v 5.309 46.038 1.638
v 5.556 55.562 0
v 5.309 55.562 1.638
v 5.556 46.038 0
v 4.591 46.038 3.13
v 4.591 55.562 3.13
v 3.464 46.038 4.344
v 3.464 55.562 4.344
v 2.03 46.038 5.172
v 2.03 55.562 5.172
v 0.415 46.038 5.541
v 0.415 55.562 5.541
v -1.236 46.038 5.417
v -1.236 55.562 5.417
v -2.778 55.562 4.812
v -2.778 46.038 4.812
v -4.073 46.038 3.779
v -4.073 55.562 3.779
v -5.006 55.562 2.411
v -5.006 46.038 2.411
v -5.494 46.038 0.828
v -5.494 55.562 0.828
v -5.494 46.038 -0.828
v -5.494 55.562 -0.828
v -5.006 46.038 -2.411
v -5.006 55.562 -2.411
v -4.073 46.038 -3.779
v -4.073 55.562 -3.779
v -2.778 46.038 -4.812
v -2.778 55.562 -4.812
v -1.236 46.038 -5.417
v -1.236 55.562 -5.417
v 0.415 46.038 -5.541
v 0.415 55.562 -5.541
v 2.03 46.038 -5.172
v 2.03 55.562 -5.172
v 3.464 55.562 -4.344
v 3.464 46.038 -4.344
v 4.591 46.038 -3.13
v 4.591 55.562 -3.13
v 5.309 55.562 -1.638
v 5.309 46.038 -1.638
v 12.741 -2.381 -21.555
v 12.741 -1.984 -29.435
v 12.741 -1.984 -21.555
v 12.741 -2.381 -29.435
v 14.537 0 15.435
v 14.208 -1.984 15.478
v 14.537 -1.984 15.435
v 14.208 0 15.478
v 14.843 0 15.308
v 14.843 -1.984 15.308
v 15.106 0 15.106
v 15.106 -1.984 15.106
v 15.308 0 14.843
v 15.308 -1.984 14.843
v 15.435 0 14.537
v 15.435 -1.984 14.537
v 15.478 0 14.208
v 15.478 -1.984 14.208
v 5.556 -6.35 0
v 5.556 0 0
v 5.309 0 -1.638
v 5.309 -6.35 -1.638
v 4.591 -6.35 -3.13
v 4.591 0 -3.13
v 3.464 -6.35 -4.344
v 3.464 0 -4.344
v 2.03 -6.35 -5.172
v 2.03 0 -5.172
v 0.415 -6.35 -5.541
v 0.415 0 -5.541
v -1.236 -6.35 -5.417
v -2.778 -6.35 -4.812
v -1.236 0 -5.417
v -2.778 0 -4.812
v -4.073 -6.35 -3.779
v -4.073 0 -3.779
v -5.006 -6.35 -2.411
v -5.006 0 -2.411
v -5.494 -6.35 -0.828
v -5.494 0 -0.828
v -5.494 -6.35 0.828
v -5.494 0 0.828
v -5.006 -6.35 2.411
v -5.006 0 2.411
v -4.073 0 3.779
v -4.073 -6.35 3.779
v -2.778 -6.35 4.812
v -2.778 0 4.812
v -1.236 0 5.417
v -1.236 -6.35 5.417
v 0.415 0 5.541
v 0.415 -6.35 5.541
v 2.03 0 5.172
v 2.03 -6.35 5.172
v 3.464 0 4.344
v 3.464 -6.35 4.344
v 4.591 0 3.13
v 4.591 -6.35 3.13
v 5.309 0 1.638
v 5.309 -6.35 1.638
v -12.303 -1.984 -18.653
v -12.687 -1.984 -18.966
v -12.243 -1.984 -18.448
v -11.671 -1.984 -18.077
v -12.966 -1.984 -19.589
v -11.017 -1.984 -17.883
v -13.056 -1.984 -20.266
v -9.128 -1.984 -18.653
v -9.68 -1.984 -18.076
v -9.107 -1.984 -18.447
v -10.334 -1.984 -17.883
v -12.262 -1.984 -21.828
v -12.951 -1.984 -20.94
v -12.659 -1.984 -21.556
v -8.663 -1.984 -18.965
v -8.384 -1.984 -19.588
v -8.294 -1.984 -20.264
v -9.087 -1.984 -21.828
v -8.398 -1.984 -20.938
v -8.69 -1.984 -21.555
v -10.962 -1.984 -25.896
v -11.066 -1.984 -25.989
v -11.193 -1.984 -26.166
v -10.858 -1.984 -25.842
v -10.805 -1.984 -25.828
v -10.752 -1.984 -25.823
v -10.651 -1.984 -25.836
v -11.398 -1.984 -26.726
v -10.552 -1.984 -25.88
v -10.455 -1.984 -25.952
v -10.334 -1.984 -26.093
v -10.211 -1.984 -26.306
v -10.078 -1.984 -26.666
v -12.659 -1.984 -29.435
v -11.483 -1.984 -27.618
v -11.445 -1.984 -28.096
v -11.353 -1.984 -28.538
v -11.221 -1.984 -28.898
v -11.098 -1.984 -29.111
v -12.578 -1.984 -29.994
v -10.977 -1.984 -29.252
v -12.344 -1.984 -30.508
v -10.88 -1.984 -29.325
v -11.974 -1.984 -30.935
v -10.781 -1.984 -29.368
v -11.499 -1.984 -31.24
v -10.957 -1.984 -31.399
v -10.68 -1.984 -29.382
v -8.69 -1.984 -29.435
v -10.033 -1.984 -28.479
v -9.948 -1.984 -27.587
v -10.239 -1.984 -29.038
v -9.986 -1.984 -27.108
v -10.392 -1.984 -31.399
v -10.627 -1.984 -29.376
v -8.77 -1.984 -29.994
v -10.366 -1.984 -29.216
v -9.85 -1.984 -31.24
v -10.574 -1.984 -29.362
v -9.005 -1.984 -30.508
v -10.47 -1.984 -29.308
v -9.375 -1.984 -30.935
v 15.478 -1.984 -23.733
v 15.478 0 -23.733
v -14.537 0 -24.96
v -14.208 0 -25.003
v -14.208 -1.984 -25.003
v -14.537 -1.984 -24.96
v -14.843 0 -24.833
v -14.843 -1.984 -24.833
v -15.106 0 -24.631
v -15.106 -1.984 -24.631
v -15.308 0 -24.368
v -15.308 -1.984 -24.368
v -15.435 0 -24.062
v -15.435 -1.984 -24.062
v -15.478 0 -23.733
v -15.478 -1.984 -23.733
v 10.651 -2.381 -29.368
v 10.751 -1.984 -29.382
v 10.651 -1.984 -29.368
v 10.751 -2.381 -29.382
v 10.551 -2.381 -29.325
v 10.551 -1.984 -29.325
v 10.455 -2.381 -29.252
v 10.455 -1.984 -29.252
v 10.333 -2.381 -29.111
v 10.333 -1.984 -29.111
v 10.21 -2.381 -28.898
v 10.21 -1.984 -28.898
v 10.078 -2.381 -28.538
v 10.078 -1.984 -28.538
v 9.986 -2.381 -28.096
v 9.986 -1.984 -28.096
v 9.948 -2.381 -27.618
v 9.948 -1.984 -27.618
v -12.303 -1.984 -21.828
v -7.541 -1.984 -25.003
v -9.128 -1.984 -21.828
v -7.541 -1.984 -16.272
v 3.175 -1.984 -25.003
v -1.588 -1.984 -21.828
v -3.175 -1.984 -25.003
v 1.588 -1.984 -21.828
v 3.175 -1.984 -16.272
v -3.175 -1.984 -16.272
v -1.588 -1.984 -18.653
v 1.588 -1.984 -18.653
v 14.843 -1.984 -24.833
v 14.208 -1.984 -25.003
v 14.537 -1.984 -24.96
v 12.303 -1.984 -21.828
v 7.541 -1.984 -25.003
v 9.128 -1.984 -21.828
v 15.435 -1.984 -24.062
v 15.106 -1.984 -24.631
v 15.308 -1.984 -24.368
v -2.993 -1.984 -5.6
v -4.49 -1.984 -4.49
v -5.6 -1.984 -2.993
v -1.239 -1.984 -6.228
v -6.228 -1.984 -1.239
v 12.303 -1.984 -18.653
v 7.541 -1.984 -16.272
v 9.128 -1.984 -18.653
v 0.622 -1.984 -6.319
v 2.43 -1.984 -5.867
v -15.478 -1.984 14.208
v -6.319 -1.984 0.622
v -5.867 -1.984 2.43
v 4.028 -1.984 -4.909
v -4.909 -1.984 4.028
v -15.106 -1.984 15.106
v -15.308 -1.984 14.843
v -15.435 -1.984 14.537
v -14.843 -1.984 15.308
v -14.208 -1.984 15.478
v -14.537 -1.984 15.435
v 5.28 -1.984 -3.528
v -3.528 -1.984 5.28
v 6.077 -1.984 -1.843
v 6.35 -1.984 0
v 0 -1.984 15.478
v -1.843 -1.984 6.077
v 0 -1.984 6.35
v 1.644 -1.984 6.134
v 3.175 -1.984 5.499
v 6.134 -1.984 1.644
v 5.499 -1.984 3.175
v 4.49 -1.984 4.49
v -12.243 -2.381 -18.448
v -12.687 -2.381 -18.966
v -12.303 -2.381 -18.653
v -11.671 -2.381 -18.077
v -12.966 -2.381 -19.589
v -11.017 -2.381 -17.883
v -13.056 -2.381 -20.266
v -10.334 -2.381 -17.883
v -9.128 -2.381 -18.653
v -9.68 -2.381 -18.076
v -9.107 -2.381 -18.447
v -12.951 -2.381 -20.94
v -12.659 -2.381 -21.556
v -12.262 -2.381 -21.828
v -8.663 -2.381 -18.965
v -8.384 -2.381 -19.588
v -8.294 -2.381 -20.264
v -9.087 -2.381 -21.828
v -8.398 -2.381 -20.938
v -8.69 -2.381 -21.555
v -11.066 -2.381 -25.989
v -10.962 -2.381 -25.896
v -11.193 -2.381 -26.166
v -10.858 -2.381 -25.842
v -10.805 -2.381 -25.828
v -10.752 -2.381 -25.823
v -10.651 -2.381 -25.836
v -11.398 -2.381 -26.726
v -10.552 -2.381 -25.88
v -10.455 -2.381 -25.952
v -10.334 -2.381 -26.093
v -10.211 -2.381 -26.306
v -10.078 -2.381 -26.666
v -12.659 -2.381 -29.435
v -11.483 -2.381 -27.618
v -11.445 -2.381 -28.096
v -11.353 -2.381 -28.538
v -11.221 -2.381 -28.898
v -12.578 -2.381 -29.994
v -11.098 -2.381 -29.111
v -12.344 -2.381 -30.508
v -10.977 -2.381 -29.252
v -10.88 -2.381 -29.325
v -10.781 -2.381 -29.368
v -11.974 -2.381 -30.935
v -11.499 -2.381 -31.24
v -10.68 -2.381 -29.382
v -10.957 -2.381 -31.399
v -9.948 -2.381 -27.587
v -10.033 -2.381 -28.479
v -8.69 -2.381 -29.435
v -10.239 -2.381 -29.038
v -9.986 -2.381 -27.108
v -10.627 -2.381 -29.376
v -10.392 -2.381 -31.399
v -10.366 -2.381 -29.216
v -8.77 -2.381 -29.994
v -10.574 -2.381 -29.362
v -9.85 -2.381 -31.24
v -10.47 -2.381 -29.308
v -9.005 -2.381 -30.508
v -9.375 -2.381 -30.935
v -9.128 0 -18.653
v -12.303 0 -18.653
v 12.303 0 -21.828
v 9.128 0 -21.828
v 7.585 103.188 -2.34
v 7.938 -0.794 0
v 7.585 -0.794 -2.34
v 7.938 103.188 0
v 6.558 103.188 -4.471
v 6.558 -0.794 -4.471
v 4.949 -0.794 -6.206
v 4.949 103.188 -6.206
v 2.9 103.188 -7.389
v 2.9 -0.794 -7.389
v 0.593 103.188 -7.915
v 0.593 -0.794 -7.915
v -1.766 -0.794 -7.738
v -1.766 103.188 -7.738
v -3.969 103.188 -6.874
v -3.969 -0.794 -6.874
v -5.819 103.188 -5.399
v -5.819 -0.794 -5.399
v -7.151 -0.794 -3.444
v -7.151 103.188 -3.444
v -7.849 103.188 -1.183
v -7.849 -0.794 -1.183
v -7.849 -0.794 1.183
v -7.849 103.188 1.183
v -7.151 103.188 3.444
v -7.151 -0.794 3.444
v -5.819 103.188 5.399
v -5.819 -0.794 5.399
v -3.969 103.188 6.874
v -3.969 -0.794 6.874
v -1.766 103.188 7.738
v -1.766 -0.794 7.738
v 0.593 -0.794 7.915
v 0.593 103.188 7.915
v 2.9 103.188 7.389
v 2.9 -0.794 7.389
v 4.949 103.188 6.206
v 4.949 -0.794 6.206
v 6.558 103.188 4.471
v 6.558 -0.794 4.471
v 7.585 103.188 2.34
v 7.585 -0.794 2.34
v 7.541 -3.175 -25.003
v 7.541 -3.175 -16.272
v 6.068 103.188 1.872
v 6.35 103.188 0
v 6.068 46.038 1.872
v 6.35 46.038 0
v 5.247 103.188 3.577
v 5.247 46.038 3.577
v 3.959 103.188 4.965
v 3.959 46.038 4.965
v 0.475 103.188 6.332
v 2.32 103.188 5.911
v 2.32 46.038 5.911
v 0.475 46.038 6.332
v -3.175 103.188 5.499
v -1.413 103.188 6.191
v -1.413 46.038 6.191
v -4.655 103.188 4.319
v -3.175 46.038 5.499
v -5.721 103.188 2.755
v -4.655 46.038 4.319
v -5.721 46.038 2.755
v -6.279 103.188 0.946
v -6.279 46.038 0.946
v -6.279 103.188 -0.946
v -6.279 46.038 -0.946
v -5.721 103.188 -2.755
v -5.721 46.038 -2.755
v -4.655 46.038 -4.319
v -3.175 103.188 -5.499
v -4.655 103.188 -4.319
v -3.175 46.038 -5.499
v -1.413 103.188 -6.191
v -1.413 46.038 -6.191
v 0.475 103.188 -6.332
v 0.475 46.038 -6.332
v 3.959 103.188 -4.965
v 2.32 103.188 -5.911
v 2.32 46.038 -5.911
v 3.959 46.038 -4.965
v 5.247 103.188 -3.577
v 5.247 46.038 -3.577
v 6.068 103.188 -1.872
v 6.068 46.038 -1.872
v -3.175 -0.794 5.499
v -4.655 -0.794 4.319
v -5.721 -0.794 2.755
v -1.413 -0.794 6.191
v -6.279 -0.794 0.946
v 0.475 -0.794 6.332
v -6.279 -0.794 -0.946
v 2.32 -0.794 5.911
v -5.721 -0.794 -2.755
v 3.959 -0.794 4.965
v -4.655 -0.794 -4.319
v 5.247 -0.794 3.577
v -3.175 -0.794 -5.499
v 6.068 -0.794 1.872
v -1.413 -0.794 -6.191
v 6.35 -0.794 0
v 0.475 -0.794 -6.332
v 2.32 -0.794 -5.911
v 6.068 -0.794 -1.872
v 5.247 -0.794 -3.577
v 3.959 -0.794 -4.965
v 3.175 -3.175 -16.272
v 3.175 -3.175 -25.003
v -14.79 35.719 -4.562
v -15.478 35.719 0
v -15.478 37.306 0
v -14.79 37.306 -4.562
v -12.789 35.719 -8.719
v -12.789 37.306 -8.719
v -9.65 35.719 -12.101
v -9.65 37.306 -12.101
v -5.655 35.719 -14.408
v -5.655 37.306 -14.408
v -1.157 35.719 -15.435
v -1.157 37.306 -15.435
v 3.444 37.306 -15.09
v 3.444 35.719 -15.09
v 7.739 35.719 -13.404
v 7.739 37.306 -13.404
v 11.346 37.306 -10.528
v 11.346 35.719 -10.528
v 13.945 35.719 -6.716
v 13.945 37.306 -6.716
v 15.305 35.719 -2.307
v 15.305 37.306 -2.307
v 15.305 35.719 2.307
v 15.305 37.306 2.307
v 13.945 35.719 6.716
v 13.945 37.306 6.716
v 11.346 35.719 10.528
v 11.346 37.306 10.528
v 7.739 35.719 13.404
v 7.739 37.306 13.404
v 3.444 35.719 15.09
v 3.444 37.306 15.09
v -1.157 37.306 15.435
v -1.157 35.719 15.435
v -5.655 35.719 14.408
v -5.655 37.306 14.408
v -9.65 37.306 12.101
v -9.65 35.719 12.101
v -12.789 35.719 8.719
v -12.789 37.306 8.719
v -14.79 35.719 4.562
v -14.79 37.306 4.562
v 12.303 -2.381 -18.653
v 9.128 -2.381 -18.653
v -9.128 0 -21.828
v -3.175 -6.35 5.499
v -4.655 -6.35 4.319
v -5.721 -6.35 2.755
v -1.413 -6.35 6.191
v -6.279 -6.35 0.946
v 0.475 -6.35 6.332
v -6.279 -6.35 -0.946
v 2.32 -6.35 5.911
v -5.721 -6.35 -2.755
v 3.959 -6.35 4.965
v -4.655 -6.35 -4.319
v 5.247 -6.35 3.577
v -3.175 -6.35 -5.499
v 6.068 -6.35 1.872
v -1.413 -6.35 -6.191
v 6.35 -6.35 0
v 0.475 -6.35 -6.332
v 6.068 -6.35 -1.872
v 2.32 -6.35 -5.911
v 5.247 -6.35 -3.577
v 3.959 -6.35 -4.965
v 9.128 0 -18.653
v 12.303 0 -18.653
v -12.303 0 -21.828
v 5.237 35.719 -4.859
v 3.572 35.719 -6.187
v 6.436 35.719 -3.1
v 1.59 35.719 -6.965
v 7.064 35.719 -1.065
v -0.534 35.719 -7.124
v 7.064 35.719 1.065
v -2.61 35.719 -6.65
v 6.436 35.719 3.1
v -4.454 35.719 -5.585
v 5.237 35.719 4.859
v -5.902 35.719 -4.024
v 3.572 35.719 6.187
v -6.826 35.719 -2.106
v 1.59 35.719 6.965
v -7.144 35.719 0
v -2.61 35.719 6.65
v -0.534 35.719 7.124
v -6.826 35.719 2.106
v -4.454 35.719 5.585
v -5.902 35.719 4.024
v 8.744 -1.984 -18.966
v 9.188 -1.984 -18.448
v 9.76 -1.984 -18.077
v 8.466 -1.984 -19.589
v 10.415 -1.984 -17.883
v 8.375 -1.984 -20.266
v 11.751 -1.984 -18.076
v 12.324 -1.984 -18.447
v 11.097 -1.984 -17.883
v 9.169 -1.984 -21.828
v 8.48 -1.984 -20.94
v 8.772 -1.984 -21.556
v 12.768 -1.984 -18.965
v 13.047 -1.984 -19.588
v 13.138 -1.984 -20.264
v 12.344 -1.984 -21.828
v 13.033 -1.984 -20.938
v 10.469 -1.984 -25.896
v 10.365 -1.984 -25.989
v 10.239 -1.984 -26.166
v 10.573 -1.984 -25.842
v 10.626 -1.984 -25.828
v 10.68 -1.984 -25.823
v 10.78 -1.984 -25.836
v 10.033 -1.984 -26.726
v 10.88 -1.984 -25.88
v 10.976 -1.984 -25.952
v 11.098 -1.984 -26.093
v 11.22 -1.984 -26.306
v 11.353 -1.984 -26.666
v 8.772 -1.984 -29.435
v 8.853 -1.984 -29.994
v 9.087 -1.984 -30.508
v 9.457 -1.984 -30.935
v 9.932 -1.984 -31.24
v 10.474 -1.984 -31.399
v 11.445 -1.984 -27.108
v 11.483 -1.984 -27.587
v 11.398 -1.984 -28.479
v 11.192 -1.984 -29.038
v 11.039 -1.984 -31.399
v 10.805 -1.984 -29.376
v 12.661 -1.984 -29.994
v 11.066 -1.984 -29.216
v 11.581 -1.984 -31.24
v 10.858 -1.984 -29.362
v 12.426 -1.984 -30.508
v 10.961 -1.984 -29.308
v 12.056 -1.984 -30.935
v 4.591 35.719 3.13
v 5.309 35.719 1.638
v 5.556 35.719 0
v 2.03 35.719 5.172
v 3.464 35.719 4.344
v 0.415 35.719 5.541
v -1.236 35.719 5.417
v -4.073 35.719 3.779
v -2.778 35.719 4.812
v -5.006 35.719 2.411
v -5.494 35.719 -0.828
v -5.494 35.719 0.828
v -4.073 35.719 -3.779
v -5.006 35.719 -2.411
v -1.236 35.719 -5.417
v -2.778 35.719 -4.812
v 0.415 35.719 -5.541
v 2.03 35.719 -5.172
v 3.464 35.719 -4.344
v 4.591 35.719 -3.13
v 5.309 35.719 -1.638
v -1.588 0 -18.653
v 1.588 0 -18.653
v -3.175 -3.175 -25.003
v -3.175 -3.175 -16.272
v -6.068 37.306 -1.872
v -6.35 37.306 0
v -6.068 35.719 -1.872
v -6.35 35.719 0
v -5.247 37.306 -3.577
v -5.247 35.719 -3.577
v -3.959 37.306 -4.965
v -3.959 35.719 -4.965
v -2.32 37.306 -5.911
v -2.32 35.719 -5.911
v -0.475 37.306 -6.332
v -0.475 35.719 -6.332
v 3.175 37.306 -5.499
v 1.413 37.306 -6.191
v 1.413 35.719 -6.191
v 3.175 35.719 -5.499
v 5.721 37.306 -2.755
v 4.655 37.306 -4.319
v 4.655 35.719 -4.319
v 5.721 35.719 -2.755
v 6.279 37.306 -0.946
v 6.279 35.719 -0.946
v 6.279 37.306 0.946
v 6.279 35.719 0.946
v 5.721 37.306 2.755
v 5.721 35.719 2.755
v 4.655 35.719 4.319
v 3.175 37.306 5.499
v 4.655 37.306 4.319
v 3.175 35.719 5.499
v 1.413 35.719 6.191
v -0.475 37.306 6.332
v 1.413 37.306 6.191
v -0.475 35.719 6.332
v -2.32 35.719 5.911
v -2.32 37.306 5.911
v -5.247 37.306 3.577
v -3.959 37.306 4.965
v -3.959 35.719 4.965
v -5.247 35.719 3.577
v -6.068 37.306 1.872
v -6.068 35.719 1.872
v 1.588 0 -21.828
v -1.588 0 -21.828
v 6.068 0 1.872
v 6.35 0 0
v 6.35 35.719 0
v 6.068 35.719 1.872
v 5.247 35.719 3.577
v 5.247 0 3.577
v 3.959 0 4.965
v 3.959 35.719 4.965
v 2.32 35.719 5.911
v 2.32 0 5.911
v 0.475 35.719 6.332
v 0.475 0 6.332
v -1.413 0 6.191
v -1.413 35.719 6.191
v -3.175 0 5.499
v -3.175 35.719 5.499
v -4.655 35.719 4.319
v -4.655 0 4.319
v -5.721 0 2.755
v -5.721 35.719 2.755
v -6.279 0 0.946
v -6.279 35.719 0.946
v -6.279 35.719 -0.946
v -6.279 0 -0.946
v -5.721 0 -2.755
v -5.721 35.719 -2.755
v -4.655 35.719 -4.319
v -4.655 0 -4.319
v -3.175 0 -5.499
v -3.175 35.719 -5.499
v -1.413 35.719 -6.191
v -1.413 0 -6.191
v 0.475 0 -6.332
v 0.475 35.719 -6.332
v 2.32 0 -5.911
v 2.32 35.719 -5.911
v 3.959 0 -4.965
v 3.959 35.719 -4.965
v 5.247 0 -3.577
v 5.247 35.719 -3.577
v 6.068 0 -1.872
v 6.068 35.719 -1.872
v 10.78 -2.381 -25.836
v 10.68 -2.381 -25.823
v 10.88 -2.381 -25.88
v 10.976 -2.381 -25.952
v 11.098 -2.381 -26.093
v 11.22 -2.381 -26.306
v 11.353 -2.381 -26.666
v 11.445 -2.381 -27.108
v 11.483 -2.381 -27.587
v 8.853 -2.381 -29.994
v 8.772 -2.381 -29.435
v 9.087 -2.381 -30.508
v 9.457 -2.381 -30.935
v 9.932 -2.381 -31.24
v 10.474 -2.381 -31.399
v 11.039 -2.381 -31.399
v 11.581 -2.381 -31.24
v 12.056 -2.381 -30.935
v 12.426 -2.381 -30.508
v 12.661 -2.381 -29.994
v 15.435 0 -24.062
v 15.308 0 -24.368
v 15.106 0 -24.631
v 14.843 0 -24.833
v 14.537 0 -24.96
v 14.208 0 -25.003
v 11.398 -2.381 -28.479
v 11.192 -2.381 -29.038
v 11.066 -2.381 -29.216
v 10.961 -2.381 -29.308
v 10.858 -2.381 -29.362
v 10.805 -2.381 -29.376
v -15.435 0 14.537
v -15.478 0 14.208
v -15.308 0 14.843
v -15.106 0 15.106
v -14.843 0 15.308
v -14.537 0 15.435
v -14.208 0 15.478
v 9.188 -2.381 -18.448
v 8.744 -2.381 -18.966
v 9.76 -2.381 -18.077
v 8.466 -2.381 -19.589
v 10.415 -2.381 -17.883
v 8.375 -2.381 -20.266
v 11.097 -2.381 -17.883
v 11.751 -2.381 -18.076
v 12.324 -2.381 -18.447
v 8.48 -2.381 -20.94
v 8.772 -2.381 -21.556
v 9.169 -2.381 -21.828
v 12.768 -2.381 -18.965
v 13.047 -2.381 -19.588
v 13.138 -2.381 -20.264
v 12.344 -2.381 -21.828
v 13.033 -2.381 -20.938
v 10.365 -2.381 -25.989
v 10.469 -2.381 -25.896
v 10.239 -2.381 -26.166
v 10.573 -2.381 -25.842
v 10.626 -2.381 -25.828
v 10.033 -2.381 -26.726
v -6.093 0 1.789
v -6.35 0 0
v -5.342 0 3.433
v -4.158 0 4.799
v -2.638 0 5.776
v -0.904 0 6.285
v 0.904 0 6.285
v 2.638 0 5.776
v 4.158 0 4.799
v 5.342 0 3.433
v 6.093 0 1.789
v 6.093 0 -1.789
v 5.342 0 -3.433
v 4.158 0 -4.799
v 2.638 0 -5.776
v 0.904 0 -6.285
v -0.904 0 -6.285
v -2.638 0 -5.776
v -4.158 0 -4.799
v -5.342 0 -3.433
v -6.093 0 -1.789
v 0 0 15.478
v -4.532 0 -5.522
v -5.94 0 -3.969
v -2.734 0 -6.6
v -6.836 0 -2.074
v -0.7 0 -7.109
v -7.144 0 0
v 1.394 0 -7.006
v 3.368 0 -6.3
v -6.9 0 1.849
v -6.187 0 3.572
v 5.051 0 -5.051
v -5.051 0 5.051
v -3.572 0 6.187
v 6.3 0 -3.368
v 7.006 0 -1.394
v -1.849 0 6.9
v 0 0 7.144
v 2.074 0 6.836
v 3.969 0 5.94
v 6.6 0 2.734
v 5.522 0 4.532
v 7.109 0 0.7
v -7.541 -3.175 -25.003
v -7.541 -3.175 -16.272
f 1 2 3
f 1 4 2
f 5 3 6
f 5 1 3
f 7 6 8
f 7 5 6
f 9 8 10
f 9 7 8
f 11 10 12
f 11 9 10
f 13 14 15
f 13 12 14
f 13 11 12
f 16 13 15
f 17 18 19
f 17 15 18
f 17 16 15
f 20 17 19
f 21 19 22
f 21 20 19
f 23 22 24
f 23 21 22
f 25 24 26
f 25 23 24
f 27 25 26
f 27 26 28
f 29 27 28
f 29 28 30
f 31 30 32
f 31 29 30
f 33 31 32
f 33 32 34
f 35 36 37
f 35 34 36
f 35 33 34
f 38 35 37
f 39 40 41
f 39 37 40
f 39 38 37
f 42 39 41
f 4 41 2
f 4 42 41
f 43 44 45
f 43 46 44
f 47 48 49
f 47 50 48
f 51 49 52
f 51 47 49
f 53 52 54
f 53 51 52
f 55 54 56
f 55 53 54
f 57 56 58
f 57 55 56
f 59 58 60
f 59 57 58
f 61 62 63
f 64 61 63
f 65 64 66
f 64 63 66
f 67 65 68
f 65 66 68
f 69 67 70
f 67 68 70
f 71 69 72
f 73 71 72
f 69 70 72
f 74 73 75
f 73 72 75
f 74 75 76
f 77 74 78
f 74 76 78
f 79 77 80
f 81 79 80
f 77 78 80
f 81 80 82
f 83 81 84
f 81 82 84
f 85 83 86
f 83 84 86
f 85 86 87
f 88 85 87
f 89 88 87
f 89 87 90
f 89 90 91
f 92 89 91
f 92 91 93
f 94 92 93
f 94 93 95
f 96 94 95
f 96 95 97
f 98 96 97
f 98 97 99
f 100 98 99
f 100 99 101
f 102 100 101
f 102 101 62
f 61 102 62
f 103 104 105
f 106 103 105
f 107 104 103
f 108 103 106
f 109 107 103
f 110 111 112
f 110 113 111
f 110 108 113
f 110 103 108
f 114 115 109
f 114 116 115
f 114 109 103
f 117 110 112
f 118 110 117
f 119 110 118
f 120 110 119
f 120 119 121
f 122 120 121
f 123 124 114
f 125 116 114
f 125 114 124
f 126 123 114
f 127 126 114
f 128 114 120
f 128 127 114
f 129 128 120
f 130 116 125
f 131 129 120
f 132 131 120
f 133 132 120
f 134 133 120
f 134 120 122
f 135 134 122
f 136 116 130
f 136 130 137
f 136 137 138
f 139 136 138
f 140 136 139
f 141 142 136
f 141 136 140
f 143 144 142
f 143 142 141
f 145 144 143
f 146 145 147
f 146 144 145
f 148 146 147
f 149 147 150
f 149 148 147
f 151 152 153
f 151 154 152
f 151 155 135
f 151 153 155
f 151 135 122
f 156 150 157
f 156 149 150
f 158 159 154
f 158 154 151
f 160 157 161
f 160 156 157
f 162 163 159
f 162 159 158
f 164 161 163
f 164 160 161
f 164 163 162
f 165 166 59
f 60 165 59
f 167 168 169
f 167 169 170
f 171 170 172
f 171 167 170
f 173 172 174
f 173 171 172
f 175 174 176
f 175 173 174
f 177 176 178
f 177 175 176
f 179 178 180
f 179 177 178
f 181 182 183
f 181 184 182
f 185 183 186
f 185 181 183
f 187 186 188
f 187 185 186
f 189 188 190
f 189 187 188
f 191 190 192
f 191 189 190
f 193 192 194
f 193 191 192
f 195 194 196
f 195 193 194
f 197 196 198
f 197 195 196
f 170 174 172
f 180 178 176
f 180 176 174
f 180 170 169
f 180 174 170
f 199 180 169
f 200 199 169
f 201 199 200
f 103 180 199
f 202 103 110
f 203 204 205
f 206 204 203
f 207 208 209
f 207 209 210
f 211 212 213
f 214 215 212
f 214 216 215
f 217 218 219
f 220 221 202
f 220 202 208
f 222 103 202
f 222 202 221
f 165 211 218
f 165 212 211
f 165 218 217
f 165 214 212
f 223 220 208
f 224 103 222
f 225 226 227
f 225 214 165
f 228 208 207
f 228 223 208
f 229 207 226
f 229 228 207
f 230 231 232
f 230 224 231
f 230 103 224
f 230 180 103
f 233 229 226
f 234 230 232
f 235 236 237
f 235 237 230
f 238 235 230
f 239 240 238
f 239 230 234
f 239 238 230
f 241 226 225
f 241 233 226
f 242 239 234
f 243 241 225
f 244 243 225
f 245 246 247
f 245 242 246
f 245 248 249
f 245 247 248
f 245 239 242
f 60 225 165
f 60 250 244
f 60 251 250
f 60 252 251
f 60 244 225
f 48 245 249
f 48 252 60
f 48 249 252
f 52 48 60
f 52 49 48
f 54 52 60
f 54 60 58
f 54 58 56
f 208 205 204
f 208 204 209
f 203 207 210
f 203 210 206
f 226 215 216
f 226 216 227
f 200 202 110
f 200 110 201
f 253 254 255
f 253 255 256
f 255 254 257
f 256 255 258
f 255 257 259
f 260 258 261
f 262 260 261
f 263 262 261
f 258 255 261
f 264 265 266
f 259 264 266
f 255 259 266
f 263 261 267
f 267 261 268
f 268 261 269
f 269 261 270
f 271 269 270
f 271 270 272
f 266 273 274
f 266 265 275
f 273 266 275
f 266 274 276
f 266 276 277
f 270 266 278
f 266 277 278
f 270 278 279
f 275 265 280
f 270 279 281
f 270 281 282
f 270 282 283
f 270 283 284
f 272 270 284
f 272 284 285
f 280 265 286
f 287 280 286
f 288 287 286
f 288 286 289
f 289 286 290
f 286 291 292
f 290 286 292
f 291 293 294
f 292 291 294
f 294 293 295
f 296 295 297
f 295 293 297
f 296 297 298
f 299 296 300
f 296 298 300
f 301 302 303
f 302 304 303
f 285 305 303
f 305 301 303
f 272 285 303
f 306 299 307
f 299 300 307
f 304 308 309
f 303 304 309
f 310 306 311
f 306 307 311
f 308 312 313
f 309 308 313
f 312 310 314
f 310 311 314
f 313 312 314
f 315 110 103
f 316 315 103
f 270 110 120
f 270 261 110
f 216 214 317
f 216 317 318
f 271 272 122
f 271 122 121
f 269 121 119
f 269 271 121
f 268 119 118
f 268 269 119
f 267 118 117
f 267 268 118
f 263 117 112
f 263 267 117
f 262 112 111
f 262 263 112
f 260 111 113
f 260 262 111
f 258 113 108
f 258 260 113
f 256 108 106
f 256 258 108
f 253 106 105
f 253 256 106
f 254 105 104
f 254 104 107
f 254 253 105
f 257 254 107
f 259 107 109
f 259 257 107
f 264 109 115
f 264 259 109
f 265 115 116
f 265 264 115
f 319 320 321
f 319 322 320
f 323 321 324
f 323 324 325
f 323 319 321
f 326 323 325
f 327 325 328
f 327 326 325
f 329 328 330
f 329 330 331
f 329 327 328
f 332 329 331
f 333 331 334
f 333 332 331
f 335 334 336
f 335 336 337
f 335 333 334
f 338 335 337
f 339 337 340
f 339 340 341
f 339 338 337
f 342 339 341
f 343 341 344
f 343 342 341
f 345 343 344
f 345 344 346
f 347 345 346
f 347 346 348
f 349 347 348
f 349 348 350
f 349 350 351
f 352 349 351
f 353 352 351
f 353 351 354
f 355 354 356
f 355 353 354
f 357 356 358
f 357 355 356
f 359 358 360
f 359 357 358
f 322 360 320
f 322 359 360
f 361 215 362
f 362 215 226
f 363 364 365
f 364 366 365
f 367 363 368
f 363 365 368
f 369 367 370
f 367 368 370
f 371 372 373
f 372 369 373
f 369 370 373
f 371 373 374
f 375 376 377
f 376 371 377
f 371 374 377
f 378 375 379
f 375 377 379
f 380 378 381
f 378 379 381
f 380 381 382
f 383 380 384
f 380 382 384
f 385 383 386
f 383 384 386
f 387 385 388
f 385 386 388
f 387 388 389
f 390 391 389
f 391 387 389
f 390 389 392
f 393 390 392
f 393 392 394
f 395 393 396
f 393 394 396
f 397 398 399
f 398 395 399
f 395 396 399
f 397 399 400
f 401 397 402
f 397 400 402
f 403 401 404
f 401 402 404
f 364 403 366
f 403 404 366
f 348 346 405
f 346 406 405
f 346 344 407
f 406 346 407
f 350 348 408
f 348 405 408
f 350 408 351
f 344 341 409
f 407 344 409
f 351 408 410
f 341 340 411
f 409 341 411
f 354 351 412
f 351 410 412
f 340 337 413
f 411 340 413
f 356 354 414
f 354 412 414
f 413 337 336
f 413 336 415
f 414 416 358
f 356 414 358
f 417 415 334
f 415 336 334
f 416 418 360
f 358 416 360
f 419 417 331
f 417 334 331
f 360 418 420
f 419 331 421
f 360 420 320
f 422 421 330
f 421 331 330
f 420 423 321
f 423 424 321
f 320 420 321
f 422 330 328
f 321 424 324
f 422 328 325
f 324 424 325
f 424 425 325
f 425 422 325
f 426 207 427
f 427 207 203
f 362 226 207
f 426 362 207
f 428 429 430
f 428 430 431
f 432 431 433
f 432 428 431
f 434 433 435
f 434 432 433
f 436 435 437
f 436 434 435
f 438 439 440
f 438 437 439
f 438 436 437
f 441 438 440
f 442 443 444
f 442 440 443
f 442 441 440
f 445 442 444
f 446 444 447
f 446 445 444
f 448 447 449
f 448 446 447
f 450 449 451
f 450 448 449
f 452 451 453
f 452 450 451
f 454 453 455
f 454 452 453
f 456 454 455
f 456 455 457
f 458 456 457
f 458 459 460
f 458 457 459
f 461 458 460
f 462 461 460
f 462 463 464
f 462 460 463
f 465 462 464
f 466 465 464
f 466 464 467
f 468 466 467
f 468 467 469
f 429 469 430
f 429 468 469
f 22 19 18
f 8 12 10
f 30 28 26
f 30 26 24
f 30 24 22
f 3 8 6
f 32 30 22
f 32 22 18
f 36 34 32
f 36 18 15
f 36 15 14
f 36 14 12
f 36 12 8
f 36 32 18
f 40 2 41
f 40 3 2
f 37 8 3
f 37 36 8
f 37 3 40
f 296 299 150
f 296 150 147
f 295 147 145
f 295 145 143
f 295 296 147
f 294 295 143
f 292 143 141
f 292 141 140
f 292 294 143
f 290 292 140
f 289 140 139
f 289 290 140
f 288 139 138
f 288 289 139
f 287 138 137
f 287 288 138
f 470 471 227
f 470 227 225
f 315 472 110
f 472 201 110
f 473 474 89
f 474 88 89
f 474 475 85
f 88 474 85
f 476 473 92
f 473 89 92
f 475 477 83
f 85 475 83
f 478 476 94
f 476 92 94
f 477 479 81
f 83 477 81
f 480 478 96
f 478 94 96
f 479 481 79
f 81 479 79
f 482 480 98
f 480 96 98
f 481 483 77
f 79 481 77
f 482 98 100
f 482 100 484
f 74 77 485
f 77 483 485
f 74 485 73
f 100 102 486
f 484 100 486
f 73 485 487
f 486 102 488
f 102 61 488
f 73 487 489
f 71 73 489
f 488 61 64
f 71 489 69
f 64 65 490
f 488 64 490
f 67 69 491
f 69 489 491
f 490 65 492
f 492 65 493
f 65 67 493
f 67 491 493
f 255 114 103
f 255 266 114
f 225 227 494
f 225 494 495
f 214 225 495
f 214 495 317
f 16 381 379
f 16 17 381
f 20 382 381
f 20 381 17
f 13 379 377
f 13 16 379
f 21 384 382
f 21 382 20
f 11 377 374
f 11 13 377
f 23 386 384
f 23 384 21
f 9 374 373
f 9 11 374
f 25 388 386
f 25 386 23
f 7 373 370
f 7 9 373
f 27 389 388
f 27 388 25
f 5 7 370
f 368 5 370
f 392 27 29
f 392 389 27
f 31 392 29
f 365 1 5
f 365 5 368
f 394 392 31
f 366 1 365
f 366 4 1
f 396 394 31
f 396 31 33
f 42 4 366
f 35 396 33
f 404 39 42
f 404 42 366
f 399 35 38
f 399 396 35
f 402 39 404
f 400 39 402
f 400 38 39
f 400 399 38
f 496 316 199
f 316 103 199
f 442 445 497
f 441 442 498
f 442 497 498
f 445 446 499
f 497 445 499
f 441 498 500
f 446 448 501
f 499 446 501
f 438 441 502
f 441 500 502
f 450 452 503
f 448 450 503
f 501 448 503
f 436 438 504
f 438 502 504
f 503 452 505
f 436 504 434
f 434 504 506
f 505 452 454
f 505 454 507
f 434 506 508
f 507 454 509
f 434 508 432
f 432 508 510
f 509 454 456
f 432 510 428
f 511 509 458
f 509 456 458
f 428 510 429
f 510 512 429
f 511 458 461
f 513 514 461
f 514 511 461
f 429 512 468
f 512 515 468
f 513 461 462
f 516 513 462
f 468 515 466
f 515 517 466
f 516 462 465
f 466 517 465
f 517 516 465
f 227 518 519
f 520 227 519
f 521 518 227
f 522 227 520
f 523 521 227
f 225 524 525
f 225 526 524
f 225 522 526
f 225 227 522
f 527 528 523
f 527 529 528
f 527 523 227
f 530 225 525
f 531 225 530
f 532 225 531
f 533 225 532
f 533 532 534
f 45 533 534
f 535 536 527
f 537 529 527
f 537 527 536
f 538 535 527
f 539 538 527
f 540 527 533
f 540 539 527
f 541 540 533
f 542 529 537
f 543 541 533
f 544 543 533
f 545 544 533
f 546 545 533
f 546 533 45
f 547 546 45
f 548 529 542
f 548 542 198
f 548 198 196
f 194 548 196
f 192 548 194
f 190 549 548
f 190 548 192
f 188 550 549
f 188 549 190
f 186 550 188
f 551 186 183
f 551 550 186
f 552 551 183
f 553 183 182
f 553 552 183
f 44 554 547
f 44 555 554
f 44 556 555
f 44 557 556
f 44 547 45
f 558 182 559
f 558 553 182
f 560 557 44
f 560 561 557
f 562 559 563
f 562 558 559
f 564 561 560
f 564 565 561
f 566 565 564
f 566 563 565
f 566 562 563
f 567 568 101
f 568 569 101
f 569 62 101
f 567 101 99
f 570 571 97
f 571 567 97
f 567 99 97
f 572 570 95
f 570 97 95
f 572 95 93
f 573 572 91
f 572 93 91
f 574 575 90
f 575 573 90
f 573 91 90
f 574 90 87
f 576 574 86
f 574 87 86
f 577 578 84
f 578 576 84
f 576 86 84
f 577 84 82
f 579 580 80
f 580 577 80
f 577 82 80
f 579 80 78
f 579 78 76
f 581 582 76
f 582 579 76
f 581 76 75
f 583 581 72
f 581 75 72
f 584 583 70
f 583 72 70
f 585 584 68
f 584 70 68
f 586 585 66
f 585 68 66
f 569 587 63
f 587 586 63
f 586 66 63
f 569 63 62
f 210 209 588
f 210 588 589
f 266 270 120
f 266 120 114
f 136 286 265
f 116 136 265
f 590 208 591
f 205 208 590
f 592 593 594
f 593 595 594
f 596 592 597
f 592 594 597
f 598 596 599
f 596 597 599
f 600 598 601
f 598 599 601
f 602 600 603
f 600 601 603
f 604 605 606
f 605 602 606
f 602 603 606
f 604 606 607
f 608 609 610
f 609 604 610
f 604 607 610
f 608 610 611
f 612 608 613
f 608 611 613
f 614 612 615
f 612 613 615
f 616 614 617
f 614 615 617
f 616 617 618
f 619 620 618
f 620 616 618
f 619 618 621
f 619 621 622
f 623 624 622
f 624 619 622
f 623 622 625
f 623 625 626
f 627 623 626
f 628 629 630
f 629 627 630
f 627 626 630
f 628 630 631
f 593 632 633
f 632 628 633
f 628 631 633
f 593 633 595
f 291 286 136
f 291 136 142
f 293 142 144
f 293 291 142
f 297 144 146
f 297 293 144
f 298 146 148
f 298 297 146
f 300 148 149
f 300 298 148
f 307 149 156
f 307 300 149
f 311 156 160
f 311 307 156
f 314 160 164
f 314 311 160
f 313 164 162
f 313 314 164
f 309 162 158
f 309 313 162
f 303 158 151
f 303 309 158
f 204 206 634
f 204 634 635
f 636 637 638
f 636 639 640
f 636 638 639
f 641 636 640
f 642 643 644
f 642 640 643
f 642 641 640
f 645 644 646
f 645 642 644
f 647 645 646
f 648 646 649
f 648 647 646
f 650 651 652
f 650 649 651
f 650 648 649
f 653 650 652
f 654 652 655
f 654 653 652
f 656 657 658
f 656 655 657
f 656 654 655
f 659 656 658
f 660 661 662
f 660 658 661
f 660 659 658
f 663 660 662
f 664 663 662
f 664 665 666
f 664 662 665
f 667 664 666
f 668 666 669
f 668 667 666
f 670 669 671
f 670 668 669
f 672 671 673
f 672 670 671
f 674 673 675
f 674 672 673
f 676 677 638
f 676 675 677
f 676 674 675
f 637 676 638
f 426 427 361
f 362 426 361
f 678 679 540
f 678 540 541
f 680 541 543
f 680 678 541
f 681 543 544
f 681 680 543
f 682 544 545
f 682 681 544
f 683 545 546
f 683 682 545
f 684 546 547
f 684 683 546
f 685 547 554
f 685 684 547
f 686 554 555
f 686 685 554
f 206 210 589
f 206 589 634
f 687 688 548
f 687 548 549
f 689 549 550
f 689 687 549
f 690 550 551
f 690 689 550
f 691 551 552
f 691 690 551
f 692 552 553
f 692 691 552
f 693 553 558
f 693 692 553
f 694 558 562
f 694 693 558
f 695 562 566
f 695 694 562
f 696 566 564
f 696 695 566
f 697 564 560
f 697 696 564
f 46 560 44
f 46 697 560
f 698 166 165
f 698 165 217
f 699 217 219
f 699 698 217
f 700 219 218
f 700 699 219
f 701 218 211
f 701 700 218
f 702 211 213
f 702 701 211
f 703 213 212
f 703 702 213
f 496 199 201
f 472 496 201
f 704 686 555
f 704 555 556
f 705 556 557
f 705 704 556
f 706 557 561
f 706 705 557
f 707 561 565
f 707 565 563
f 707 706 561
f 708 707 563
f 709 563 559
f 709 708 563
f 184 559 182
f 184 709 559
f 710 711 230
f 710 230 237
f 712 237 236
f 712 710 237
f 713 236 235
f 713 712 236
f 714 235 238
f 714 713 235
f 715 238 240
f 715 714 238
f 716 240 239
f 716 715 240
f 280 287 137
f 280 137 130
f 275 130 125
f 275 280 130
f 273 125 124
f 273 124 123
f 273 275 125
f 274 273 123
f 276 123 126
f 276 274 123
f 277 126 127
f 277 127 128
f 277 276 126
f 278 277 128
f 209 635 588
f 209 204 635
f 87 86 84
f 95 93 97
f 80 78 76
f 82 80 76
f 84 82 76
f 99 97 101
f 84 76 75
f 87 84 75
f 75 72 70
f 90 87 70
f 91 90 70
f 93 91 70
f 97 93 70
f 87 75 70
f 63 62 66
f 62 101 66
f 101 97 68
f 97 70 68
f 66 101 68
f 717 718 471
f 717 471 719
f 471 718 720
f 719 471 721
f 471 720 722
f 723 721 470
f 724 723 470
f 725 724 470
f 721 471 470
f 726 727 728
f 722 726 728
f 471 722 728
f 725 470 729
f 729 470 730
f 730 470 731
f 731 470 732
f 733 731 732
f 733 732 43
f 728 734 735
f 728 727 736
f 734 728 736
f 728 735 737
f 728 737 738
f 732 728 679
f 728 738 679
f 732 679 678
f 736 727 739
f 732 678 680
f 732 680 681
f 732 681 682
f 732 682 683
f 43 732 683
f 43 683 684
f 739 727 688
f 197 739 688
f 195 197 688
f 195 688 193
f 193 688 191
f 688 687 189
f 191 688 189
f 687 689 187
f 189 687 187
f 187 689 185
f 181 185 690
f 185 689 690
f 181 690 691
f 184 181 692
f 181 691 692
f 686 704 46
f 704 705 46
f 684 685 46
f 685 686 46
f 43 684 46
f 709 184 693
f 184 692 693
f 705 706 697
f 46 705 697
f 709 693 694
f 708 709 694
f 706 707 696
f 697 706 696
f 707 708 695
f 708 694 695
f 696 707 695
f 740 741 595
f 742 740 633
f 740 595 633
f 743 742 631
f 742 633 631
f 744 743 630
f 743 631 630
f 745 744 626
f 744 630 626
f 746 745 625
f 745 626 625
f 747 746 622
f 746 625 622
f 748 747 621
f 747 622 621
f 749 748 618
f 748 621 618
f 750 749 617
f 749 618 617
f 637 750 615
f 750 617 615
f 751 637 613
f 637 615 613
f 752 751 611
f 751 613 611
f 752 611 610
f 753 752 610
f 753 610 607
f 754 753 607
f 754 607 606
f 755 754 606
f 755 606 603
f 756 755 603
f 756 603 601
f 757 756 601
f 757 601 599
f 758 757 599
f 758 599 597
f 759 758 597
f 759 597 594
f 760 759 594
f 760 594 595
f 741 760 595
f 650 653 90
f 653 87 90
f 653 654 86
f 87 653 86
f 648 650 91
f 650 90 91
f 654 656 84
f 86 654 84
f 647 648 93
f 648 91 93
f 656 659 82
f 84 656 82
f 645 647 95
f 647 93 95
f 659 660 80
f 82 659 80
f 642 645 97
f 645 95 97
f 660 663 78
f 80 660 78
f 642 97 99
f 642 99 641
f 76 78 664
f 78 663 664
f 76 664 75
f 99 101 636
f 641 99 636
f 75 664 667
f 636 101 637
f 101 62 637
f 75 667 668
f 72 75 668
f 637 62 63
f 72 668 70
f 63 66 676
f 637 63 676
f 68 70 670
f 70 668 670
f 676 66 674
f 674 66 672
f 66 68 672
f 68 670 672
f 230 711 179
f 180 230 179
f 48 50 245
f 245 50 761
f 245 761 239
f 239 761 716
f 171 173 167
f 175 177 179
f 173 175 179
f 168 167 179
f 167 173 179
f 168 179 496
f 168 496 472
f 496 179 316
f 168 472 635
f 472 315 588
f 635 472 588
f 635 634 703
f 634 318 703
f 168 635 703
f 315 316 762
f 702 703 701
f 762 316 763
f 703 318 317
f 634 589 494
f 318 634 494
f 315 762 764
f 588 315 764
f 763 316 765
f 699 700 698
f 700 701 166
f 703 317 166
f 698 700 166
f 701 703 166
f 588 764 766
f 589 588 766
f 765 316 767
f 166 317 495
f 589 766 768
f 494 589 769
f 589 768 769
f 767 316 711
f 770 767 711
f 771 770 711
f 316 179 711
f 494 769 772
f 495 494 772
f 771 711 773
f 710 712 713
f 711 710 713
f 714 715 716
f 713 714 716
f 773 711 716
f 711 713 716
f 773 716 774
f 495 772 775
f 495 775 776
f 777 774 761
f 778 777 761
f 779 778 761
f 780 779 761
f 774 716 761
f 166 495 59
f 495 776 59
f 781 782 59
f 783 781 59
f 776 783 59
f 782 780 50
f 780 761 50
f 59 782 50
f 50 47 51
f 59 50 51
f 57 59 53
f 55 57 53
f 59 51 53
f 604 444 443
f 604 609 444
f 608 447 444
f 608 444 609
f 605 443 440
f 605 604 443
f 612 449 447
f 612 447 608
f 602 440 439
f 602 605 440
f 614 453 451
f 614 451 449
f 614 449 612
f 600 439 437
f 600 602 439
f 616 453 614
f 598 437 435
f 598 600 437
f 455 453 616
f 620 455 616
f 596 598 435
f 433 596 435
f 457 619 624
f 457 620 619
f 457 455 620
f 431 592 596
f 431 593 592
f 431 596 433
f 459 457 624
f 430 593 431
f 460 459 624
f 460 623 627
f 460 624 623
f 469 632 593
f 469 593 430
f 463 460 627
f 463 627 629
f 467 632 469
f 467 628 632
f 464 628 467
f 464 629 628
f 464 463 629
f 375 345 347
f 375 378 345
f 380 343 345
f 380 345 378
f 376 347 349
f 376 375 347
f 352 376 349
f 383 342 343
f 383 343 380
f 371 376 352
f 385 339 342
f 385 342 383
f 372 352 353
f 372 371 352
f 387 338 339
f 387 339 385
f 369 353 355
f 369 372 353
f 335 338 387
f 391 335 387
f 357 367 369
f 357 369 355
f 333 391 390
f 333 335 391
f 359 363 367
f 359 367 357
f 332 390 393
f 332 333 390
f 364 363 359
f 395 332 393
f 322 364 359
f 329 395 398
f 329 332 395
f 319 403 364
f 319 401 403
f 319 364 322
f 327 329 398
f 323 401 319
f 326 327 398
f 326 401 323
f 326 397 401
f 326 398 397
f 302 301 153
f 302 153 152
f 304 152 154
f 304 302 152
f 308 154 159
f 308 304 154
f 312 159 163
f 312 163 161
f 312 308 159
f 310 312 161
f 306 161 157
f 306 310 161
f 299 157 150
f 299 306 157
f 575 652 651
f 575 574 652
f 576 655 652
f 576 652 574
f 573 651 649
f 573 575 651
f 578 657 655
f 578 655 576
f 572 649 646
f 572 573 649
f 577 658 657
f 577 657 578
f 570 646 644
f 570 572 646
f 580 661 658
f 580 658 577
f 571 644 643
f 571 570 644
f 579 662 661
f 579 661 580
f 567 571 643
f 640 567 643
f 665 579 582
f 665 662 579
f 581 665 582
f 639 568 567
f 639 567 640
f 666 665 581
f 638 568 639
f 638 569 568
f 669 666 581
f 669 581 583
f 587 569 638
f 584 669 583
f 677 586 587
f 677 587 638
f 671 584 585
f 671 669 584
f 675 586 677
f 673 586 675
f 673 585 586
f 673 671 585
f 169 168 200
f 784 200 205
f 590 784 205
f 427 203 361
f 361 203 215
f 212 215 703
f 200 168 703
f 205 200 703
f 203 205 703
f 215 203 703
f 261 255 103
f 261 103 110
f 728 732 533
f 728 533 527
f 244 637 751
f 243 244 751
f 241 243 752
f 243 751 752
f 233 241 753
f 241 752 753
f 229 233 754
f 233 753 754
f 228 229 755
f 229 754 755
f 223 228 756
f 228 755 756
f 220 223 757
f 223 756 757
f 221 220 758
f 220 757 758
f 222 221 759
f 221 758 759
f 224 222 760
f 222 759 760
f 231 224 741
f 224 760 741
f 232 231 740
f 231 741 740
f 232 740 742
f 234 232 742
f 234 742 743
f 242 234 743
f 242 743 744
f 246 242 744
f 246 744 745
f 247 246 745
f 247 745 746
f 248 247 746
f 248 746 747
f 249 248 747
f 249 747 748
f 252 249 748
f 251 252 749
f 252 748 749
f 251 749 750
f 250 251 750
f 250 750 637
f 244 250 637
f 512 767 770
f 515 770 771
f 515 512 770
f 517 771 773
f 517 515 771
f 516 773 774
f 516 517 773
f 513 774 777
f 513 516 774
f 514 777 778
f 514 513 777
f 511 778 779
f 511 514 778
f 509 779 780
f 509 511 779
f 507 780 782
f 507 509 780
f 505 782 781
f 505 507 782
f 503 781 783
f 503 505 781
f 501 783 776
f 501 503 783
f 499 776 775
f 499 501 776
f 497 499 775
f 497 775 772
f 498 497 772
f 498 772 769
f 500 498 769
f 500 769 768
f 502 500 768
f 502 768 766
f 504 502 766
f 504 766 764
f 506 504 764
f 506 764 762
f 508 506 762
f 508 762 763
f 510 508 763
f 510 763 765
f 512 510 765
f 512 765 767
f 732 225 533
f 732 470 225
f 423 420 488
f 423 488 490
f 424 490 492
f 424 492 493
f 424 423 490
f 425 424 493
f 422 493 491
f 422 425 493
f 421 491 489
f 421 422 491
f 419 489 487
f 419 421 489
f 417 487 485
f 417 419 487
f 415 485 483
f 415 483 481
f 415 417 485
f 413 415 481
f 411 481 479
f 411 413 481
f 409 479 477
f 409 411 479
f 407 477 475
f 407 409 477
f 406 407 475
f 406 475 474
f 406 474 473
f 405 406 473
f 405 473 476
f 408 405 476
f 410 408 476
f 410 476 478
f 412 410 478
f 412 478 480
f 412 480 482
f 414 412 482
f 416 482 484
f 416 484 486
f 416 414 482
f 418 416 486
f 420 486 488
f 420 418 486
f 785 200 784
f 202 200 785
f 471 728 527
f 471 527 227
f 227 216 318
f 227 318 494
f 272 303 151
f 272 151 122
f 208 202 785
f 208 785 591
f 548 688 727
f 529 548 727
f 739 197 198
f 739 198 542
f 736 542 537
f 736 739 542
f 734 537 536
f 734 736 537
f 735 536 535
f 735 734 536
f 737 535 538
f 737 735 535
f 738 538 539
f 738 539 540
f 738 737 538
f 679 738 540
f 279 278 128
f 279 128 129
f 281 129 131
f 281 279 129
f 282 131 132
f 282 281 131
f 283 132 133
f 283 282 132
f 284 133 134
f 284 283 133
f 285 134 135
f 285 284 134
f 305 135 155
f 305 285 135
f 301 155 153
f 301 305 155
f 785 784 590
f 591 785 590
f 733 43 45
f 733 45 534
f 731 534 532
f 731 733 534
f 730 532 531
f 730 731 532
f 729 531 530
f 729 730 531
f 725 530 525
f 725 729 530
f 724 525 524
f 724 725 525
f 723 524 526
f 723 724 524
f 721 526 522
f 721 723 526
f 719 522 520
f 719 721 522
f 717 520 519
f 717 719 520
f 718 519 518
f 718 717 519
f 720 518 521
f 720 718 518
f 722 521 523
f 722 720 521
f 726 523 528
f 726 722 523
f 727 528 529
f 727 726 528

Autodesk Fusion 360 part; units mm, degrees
sketch "Sketch1" plane through (0, 0, 0) normal (0, 1, 0) x (1, 0, 0) in component "Winding"
  circle A0 centre (0, 0) radius 11.9062
  circle A1 centre (0, 0) radius 6.35
  circle A2 centre (0, 0) radius 7.1437
  dimension "d1" = 23.8125
  dimension "d2" = 12.7
  dimension "d3" = 0.7937
extrude "Extrude1" add sketch "Sketch1" along normal blind 35.7188 contours A0 makes body 1 in component "Winding"
sketch "Sketch1 (2)" plane through (0, 35.7188, 0) normal (0, 1, 0) x (-1, 0, 0) in component "Coil Body"
  circle A0 centre (0, 0) radius 7.1437
  circle A1 centre (0, 0) radius 11.9062
  circle A2 centre (-50.8, 0) radius 15.4781
  circle A3 centre (-50.8, 0) radius 6.35
  circle A4 centre (-50.8, 0) radius 7.1437
  point P0 (-50.8, 0)
  dimension "d6" = 30.9563
  dimension "d7" = 12.7
  dimension "d8" = 0.7937
extrude "Extrude1'" add sketch "Sketch1 (2)" against normal blind 35.7188 separate body contours A4 makes body 2 in component "Coil Body"
extrude "Extrude2" add sketch "Sketch1 (2)" along normal blind 1.5875 contours A2 | A4 bodies 2 in component "Coil Body"
sketch "Sketch2" plane through (0, 0, 0) normal (0, -1, 0) x (1, 0, 0) in component "Coil Body"
  circle A0 centre (50.8, 0) radius 6.35
  circle A1 centre (50.8, 0) radius 7.1438
  line L0 (50.8, 0) -> (50.8, 6.35)
  circle A2 centre (50.8, 0) radius 15.4781
  line L1 (50.8, 6.35) -> (50.8, 15.4781)
  line L2 (50.8, 15.4781) -> (65.0081, 15.4781)
  line L3 (50.8, 15.4781) -> (36.5919, 15.4781)
  line L4 (35.3219, 14.2081) -> (35.3219, -23.7331)
  line L5 (36.5919, -25.0031) -> (65.0081, -25.0031)
  line L6 (66.2781, -23.7331) -> (66.2781, 14.2081)
  arc A3 (35.3219, -23.7331) -> (36.5919, -25.0031) centre (36.5919, -23.7331) ccw
  arc A4 (65.0081, -25.0031) -> (66.2781, -23.7331) centre (65.0081, -23.7331) ccw
  arc A5 (66.2781, 14.2081) -> (65.0081, 15.4781) centre (65.0081, 14.2081) ccw
  arc A6 (36.5919, 15.4781) -> (35.3219, 14.2081) centre (36.5919, 14.2081) ccw
  point P0 (66.2781, 15.4781)
  point P1 (35.3219, 15.4781)
  point P2 (35.3219, -25.0031)
  point P3 (66.2781, -25.0031)
  dimension "d13" = 15.4781
  dimension "d14" = 15.4781
  dimension "d15" = 40.4812
  dimension "d16" = 30.9563
  dimension "d19" = 1.27
  dimension "d20" = 1.27
  dimension "d21" = 1.27
  dimension "d22" = 1.27
extrude "Extrude3" add sketch "Sketch2" along normal blind 1.9844 contours A1 | A2 | A2 L3 L4 A6 | A2 L2 L6 A5 | A2 L4 L5 L6 A3 A4 bodies 2 in component "Coil Body"
sketch "Sketch3" plane through (0, -1.9844, 0) normal (0, -1, 0) x (1, 0, 0) in component "Coil Body"
  circle A0 centre (50.8, 0) radius 6.35
  line L0 (65.0081, 15.4781) -> (36.5919, 15.4781)
  arc A1 (36.5919, 15.4781) -> (35.3219, 14.2081) centre (36.5919, 14.2081) ccw
  line L1 (35.3219, 14.2081) -> (35.3219, -23.7331)
  arc A2 (35.3219, -23.7331) -> (36.5919, -25.0031) centre (36.5919, -23.7331) ccw
  line L2 (36.5919, -25.0031) -> (65.0081, -25.0031)
  arc A3 (65.0081, -25.0031) -> (66.2781, -23.7331) centre (65.0081, -23.7331) ccw
  line L3 (66.2781, -23.7331) -> (66.2781, 14.2081)
  arc A4 (66.2781, 14.2081) -> (65.0081, 15.4781) centre (65.0081, 14.2081) ccw
  line L4 (35.3219, -25.0031) -> (38.4969, -25.0031)
  line L5 (38.4969, -25.0031) -> (38.4969, -21.8281)
  line L6 (38.4969, -21.8281) -> (41.6719, -21.8281)
  line L7 (41.6719, -21.8281) -> (41.6719, -18.6531)
  line L8 (41.6719, -18.6531) -> (38.4969, -18.6531)
  line L9 (38.4969, -18.6531) -> (38.4969, -21.8281)
  line L10 (66.2781, -25.0031) -> (63.1031, -25.0031)
  line L11 (63.1031, -25.0031) -> (63.1031, -21.8281)
  line L12 (63.1031, -21.8281) -> (59.9281, -21.8281)
  line L13 (59.9281, -21.8281) -> (59.9281, -18.6531)
  line L14 (59.9281, -18.6531) -> (63.1031, -18.6531)
  line L15 (63.1031, -18.6531) -> (63.1031, -21.8281)
  line L16 (50.8, -25.0031) -> (52.3875, -25.0031)
  line L17 (52.3875, -25.0031) -> (52.3875, -21.8281)
  line L18 (52.3875, -21.8281) -> (49.2125, -21.8281)
  line L19 (49.2125, -21.8281) -> (49.2125, -18.6531)
  line L20 (49.2125, -18.6531) -> (52.3875, -18.6531)
  line L21 (52.3875, -18.6531) -> (52.3875, -21.8281)
  dimension "d23" = 3.175
  dimension "d24" = 3.175
  dimension "d25" = 3.175
  dimension "d26" = 3.175
  dimension "d27" = 3.175
  dimension "d28" = 3.175
  dimension "d29" = 3.175
  dimension "d30" = 3.175
  dimension "d31" = 1.5875
  dimension "d32" = 3.175
  dimension "d33" = 3.175
  dimension "d34" = 3.175
extrude "Extrude4" cut sketch "Sketch3" against normal blind 1.9844 contours L6 L7 L8 L9 | L18 L19 L20 L21 | L12 L13 L14 L15 bodies 2 in component "Coil Body"
sketch "Sketch4" plane through (0, -1.9844, 0) normal (0, -1, 0) x (1, 0, 0) in component "Coil Body"
  line L0 (49.2125, -21.8281) -> (49.2125, -18.6531)
  line L1 (49.2125, -18.6531) -> (52.3875, -18.6531)
  line L2 (52.3875, -18.6531) -> (52.3875, -21.8281)
  line L3 (52.3875, -21.8281) -> (49.2125, -21.8281)
  line L4 (41.6719, -21.8281) -> (38.4969, -21.8281)
  line L5 (38.4969, -21.8281) -> (38.4969, -18.6531)
  line L6 (38.4969, -18.6531) -> (41.6719, -18.6531)
  line L7 (41.6719, -18.6531) -> (41.6719, -21.8281)
  line L8 (59.9281, -21.8281) -> (59.9281, -18.6531)
  line L9 (59.9281, -18.6531) -> (63.1031, -18.6531)
  line L10 (63.1031, -18.6531) -> (63.1031, -21.8281)
  line L11 (63.1031, -21.8281) -> (59.9281, -21.8281)
  circle A0 centre (50.8, 0) radius 6.35
  line L12 (65.0081, 15.4781) -> (36.5919, 15.4781)
  arc A1 (36.5919, 15.4781) -> (35.3219, 14.2081) centre (36.5919, 14.2081) ccw
  line L13 (35.3219, 14.2081) -> (35.3219, -23.7331)
  arc A2 (35.3219, -23.7331) -> (36.5919, -25.0031) centre (36.5919, -23.7331) ccw
  line L14 (36.5919, -25.0031) -> (65.0081, -25.0031)
  arc A3 (65.0081, -25.0031) -> (66.2781, -23.7331) centre (65.0081, -23.7331) ccw
  line L15 (66.2781, -23.7331) -> (66.2781, 14.2081)
  arc A4 (66.2781, 14.2081) -> (65.0081, 15.4781) centre (65.0081, 14.2081) ccw
  line L16 (50.8, -25.0031) -> (53.975, -25.0031)
  line L17 (50.8, -25.0031) -> (47.625, -25.0031)
  line L18 (47.625, -25.0031) -> (43.2594, -25.0031)
  line L19 (43.2594, -25.0031) -> (43.2594, -16.2719)
  line L20 (43.2594, -16.2719) -> (47.625, -16.2719)
  line L21 (47.625, -16.2719) -> (47.625, -25.0031)
  line L22 (53.975, -25.0031) -> (58.3406, -25.0031)
  line L23 (58.3406, -25.0031) -> (58.3406, -16.2719)
  line L24 (58.3406, -16.2719) -> (53.975, -16.2719)
  line L25 (53.975, -16.2719) -> (53.975, -25.0031)
  dimension "d37" = 3.175
  dimension "d40" = 3.175
  dimension "d41" = 8.7313
  dimension "d42" = 4.3656
  dimension "d43" = 8.7313
  dimension "d44" = 4.3656
extrude "Extrude5" add sketch "Sketch4" along normal blind 1.1906 contours L14 L22 L23 L24 L25 | L14 L18 L19 L20 L21 bodies 2 in component "Coil Body"
sketch "Sketch1 (3)" plane through (0, 0, 0) normal (0, 1, 0) x (1, 0, 0) in component "Solder Tab"
  line L0 (12.6083, 21.8281) -> (9.4333, 21.8281)
  line L1 (12.5671, 18.6531) -> (12.6083, 21.8281)
  line L2 (9.3921, 18.6531) -> (12.5671, 18.6531)
  line L3 (9.4333, 21.8281) -> (9.3921, 18.6531)
  circle A0 centre (11.0204, 20.2395) radius 2.3813
  line L4 (11.0208, 21.8281) -> (9.0364, 21.8281)
  line L5 (9.0364, 21.8281) -> (13.0052, 21.8281)
  line L6 (9.0364, 21.8281) -> (9.0364, 21.5564)
  line L7 (13.0052, 21.8281) -> (13.0052, 21.7834)
  line L8 (13.0052, 21.7834) -> (13.0052, 21.5552)
  line L9 (9.0364, 29.4349) -> (9.0364, 21.8281)
  line L10 (13.0052, 21.8281) -> (13.0052, 29.4349)
  arc A1 (13.0052, 29.4349) -> (9.0364, 29.4349) centre (11.0208, 29.4349) ccw
  ellipse E0 centre (10.9794, 27.6022) end of major axis (10.9437, 25.8229) minor radius 0.7677
  line L11 (11.015, 29.3815) -> (10.9437, 25.8229)
  line L12 (10.2118, 27.6176) -> (11.7469, 27.5868)
  line L13 (9.0364, 29.4349) -> (13.0052, 29.4349)
  dimension "d47" = 4.7625
  dimension "d48" = 1.9844
  dimension "d49" = 3.9688
  dimension "d52" = 3.9688
extrude "Extrude1''" add sketch "Sketch1 (3)" along normal blind 0.3969 separate body contours L1 L2 L3 A0 L4 L5 | L0 A0 L4 L5 | A0 L5 L7 L8 | A0 L4 L5 L9 L10 L13 | A0 L4 L5 L6 | A1 L13 makes body 3 in component "Solder Tab"
component "Winding" placed x (1, 0, 0) y (0, 1, 0) z (0, 0, 1) at (0, 0, 0)
component "Coil Body" placed x (1, 0, 0) y (0, 1, 0) z (0, 0, 1) at (-50.8, 0, 0)
component "Solder Tab" placed x (1, 0, 0) y (0, 1, 0) z (0, 0, 1) at (-0.264, -2.3813, 0)
component "Solder Tab" placed x (1, 0, 0) y (0, 1, 0) z (0, 0, 1) at (-21.6952, -2.3812, 0)
equation "d1 = ( 15 / 16 ) * 1 in"
equation "d2 = ( 1 / 2 ) * 1 in"
equation "d3 = ( 1 / 32 ) * 1 in"
equation "d4 = 1 13/32\""
equation "d6 = 1 7/32\""
equation "d7 = ( 1 / 2 ) * 1 in"
equation "d8 = ( 1 / 32 ) * 1 in"
equation "d9 = -1 13/32\""
equation "d11 = ( 1 / 16 ) * 1 in"
equation "d13 = ( 39 / 64 ) * 1 in"
equation "d14 = ( 39 / 64 ) * 1 in"
equation "d15 = 1 19/32\""
equation "d16 = 1 7/32\""
equation "d17 = ( 5 / 64 ) * 1 in"
equation "d23 = ( 1 / 8 ) * 1 in"
equation "d24 = ( 1 / 8 ) * 1 in"
equation "d25 = ( 1 / 8 ) * 1 in"
equation "d26 = ( 1 / 8 ) * 1 in"
equation "d27 = ( 1 / 8 ) * 1 in"
equation "d28 = ( 1 / 8 ) * 1 in"
equation "d29 = ( 1 / 8 ) * 1 in"
equation "d30 = ( 1 / 8 ) * 1 in"
equation "d31 = ( 1 / 16 ) * 1 in"
equation "d32 = ( 1 / 8 ) * 1 in"
equation "d33 = ( 1 / 8 ) * 1 in"
equation "d34 = ( 1 / 8 ) * 1 in"
equation "d35 = ( -5 / 64 ) * 1 in"
equation "d37 = ( 1 / 8 ) * 1 in"
equation "d40 = ( 1 / 8 ) * 1 in"
equation "d41 = ( 11 / 32 ) * 1 in"
equation "d42 = ( 11 / 64 ) * 1 in"
equation "d43 = ( 11 / 32 ) * 1 in"
equation "d44 = ( 11 / 64 ) * 1 in"
equation "d45 = ( 3 / 64 ) * 1 in"
equation "d47 = ( 3 / 16 ) * 1 in"
equation "d48 = ( 5 / 64 ) * 1 in"
equation "d49 = ( 5 / 32 ) * 1 in"
equation "d52 = ( 5 / 32 ) * 1 in"
equation "d53 = ( 1 / 64 ) * 1 in"

Autodesk Fusion 360 part; units mm, degrees
sketch "Sketch1" plane through (0, 0, 0) normal (0, 1, 0) x (1, 0, 0)
  circle A0 centre (0, 0) radius 11.1125
  circle A1 centre (0, 0) radius 5.5562
  circle A2 centre (0, 0) radius 3.9688
  dimension "d1" = 22.225
  dimension "d2" = 11.1125
  dimension "d3" = 7.9375
extrude "Extrude1" add sketch "Sketch1" along normal blind 103.1875 contours A2
extrude "Extrude2" add sketch "Sketch1" along normal blind 55.5625 contours A1
extrude "Extrude3" add sketch "Sketch1" along normal blind 6.35 contours A0
equation "d1 = ( 7 / 8 ) * 1 in"
equation "d2 = ( 7 / 16 ) * 1 in"
equation "d3 = ( 5 / 16 ) * 1 in"
equation "d4 = 4 1/16\""
equation "d6 = 2 3/16\""
equation "d8 = ( 1 / 4 ) * 1 in"

Autodesk Fusion 360 part; units mm, degrees
sketch "Sketch1" plane through (0, 0, 0) normal (0, 1, 0) x (1, 0, 0)
  circle A0 centre (0, 0) radius 6.35
  circle A1 centre (0, 0) radius 5.5563
  circle A2 centre (0, 0) radius 7.9375
  dimension "d1" = 12.7
  dimension "d2" = 0.7937
  dimension "d3" = 15.875
extrude "Extrude1" add sketch "Sketch1" along normal blind 46.0375 contours A0
extrude "Extrude2" add sketch "Sketch1" against normal blind 6.35 contours A0
extrude "Extrude3" add sketch "Sketch1" against normal blind 0.7937 contours A2
equation "d1 = ( 1 / 2 ) * 1 in"
equation "d2 = ( 1 / 32 ) * 1 in"
equation "d3 = ( 5 / 8 ) * 1 in"
equation "d4 = 1 13/16\""
equation "d6 = ( -1 / 4 ) * 1 in"
equation "d8 = ( -1 / 32 ) * 1 in"
